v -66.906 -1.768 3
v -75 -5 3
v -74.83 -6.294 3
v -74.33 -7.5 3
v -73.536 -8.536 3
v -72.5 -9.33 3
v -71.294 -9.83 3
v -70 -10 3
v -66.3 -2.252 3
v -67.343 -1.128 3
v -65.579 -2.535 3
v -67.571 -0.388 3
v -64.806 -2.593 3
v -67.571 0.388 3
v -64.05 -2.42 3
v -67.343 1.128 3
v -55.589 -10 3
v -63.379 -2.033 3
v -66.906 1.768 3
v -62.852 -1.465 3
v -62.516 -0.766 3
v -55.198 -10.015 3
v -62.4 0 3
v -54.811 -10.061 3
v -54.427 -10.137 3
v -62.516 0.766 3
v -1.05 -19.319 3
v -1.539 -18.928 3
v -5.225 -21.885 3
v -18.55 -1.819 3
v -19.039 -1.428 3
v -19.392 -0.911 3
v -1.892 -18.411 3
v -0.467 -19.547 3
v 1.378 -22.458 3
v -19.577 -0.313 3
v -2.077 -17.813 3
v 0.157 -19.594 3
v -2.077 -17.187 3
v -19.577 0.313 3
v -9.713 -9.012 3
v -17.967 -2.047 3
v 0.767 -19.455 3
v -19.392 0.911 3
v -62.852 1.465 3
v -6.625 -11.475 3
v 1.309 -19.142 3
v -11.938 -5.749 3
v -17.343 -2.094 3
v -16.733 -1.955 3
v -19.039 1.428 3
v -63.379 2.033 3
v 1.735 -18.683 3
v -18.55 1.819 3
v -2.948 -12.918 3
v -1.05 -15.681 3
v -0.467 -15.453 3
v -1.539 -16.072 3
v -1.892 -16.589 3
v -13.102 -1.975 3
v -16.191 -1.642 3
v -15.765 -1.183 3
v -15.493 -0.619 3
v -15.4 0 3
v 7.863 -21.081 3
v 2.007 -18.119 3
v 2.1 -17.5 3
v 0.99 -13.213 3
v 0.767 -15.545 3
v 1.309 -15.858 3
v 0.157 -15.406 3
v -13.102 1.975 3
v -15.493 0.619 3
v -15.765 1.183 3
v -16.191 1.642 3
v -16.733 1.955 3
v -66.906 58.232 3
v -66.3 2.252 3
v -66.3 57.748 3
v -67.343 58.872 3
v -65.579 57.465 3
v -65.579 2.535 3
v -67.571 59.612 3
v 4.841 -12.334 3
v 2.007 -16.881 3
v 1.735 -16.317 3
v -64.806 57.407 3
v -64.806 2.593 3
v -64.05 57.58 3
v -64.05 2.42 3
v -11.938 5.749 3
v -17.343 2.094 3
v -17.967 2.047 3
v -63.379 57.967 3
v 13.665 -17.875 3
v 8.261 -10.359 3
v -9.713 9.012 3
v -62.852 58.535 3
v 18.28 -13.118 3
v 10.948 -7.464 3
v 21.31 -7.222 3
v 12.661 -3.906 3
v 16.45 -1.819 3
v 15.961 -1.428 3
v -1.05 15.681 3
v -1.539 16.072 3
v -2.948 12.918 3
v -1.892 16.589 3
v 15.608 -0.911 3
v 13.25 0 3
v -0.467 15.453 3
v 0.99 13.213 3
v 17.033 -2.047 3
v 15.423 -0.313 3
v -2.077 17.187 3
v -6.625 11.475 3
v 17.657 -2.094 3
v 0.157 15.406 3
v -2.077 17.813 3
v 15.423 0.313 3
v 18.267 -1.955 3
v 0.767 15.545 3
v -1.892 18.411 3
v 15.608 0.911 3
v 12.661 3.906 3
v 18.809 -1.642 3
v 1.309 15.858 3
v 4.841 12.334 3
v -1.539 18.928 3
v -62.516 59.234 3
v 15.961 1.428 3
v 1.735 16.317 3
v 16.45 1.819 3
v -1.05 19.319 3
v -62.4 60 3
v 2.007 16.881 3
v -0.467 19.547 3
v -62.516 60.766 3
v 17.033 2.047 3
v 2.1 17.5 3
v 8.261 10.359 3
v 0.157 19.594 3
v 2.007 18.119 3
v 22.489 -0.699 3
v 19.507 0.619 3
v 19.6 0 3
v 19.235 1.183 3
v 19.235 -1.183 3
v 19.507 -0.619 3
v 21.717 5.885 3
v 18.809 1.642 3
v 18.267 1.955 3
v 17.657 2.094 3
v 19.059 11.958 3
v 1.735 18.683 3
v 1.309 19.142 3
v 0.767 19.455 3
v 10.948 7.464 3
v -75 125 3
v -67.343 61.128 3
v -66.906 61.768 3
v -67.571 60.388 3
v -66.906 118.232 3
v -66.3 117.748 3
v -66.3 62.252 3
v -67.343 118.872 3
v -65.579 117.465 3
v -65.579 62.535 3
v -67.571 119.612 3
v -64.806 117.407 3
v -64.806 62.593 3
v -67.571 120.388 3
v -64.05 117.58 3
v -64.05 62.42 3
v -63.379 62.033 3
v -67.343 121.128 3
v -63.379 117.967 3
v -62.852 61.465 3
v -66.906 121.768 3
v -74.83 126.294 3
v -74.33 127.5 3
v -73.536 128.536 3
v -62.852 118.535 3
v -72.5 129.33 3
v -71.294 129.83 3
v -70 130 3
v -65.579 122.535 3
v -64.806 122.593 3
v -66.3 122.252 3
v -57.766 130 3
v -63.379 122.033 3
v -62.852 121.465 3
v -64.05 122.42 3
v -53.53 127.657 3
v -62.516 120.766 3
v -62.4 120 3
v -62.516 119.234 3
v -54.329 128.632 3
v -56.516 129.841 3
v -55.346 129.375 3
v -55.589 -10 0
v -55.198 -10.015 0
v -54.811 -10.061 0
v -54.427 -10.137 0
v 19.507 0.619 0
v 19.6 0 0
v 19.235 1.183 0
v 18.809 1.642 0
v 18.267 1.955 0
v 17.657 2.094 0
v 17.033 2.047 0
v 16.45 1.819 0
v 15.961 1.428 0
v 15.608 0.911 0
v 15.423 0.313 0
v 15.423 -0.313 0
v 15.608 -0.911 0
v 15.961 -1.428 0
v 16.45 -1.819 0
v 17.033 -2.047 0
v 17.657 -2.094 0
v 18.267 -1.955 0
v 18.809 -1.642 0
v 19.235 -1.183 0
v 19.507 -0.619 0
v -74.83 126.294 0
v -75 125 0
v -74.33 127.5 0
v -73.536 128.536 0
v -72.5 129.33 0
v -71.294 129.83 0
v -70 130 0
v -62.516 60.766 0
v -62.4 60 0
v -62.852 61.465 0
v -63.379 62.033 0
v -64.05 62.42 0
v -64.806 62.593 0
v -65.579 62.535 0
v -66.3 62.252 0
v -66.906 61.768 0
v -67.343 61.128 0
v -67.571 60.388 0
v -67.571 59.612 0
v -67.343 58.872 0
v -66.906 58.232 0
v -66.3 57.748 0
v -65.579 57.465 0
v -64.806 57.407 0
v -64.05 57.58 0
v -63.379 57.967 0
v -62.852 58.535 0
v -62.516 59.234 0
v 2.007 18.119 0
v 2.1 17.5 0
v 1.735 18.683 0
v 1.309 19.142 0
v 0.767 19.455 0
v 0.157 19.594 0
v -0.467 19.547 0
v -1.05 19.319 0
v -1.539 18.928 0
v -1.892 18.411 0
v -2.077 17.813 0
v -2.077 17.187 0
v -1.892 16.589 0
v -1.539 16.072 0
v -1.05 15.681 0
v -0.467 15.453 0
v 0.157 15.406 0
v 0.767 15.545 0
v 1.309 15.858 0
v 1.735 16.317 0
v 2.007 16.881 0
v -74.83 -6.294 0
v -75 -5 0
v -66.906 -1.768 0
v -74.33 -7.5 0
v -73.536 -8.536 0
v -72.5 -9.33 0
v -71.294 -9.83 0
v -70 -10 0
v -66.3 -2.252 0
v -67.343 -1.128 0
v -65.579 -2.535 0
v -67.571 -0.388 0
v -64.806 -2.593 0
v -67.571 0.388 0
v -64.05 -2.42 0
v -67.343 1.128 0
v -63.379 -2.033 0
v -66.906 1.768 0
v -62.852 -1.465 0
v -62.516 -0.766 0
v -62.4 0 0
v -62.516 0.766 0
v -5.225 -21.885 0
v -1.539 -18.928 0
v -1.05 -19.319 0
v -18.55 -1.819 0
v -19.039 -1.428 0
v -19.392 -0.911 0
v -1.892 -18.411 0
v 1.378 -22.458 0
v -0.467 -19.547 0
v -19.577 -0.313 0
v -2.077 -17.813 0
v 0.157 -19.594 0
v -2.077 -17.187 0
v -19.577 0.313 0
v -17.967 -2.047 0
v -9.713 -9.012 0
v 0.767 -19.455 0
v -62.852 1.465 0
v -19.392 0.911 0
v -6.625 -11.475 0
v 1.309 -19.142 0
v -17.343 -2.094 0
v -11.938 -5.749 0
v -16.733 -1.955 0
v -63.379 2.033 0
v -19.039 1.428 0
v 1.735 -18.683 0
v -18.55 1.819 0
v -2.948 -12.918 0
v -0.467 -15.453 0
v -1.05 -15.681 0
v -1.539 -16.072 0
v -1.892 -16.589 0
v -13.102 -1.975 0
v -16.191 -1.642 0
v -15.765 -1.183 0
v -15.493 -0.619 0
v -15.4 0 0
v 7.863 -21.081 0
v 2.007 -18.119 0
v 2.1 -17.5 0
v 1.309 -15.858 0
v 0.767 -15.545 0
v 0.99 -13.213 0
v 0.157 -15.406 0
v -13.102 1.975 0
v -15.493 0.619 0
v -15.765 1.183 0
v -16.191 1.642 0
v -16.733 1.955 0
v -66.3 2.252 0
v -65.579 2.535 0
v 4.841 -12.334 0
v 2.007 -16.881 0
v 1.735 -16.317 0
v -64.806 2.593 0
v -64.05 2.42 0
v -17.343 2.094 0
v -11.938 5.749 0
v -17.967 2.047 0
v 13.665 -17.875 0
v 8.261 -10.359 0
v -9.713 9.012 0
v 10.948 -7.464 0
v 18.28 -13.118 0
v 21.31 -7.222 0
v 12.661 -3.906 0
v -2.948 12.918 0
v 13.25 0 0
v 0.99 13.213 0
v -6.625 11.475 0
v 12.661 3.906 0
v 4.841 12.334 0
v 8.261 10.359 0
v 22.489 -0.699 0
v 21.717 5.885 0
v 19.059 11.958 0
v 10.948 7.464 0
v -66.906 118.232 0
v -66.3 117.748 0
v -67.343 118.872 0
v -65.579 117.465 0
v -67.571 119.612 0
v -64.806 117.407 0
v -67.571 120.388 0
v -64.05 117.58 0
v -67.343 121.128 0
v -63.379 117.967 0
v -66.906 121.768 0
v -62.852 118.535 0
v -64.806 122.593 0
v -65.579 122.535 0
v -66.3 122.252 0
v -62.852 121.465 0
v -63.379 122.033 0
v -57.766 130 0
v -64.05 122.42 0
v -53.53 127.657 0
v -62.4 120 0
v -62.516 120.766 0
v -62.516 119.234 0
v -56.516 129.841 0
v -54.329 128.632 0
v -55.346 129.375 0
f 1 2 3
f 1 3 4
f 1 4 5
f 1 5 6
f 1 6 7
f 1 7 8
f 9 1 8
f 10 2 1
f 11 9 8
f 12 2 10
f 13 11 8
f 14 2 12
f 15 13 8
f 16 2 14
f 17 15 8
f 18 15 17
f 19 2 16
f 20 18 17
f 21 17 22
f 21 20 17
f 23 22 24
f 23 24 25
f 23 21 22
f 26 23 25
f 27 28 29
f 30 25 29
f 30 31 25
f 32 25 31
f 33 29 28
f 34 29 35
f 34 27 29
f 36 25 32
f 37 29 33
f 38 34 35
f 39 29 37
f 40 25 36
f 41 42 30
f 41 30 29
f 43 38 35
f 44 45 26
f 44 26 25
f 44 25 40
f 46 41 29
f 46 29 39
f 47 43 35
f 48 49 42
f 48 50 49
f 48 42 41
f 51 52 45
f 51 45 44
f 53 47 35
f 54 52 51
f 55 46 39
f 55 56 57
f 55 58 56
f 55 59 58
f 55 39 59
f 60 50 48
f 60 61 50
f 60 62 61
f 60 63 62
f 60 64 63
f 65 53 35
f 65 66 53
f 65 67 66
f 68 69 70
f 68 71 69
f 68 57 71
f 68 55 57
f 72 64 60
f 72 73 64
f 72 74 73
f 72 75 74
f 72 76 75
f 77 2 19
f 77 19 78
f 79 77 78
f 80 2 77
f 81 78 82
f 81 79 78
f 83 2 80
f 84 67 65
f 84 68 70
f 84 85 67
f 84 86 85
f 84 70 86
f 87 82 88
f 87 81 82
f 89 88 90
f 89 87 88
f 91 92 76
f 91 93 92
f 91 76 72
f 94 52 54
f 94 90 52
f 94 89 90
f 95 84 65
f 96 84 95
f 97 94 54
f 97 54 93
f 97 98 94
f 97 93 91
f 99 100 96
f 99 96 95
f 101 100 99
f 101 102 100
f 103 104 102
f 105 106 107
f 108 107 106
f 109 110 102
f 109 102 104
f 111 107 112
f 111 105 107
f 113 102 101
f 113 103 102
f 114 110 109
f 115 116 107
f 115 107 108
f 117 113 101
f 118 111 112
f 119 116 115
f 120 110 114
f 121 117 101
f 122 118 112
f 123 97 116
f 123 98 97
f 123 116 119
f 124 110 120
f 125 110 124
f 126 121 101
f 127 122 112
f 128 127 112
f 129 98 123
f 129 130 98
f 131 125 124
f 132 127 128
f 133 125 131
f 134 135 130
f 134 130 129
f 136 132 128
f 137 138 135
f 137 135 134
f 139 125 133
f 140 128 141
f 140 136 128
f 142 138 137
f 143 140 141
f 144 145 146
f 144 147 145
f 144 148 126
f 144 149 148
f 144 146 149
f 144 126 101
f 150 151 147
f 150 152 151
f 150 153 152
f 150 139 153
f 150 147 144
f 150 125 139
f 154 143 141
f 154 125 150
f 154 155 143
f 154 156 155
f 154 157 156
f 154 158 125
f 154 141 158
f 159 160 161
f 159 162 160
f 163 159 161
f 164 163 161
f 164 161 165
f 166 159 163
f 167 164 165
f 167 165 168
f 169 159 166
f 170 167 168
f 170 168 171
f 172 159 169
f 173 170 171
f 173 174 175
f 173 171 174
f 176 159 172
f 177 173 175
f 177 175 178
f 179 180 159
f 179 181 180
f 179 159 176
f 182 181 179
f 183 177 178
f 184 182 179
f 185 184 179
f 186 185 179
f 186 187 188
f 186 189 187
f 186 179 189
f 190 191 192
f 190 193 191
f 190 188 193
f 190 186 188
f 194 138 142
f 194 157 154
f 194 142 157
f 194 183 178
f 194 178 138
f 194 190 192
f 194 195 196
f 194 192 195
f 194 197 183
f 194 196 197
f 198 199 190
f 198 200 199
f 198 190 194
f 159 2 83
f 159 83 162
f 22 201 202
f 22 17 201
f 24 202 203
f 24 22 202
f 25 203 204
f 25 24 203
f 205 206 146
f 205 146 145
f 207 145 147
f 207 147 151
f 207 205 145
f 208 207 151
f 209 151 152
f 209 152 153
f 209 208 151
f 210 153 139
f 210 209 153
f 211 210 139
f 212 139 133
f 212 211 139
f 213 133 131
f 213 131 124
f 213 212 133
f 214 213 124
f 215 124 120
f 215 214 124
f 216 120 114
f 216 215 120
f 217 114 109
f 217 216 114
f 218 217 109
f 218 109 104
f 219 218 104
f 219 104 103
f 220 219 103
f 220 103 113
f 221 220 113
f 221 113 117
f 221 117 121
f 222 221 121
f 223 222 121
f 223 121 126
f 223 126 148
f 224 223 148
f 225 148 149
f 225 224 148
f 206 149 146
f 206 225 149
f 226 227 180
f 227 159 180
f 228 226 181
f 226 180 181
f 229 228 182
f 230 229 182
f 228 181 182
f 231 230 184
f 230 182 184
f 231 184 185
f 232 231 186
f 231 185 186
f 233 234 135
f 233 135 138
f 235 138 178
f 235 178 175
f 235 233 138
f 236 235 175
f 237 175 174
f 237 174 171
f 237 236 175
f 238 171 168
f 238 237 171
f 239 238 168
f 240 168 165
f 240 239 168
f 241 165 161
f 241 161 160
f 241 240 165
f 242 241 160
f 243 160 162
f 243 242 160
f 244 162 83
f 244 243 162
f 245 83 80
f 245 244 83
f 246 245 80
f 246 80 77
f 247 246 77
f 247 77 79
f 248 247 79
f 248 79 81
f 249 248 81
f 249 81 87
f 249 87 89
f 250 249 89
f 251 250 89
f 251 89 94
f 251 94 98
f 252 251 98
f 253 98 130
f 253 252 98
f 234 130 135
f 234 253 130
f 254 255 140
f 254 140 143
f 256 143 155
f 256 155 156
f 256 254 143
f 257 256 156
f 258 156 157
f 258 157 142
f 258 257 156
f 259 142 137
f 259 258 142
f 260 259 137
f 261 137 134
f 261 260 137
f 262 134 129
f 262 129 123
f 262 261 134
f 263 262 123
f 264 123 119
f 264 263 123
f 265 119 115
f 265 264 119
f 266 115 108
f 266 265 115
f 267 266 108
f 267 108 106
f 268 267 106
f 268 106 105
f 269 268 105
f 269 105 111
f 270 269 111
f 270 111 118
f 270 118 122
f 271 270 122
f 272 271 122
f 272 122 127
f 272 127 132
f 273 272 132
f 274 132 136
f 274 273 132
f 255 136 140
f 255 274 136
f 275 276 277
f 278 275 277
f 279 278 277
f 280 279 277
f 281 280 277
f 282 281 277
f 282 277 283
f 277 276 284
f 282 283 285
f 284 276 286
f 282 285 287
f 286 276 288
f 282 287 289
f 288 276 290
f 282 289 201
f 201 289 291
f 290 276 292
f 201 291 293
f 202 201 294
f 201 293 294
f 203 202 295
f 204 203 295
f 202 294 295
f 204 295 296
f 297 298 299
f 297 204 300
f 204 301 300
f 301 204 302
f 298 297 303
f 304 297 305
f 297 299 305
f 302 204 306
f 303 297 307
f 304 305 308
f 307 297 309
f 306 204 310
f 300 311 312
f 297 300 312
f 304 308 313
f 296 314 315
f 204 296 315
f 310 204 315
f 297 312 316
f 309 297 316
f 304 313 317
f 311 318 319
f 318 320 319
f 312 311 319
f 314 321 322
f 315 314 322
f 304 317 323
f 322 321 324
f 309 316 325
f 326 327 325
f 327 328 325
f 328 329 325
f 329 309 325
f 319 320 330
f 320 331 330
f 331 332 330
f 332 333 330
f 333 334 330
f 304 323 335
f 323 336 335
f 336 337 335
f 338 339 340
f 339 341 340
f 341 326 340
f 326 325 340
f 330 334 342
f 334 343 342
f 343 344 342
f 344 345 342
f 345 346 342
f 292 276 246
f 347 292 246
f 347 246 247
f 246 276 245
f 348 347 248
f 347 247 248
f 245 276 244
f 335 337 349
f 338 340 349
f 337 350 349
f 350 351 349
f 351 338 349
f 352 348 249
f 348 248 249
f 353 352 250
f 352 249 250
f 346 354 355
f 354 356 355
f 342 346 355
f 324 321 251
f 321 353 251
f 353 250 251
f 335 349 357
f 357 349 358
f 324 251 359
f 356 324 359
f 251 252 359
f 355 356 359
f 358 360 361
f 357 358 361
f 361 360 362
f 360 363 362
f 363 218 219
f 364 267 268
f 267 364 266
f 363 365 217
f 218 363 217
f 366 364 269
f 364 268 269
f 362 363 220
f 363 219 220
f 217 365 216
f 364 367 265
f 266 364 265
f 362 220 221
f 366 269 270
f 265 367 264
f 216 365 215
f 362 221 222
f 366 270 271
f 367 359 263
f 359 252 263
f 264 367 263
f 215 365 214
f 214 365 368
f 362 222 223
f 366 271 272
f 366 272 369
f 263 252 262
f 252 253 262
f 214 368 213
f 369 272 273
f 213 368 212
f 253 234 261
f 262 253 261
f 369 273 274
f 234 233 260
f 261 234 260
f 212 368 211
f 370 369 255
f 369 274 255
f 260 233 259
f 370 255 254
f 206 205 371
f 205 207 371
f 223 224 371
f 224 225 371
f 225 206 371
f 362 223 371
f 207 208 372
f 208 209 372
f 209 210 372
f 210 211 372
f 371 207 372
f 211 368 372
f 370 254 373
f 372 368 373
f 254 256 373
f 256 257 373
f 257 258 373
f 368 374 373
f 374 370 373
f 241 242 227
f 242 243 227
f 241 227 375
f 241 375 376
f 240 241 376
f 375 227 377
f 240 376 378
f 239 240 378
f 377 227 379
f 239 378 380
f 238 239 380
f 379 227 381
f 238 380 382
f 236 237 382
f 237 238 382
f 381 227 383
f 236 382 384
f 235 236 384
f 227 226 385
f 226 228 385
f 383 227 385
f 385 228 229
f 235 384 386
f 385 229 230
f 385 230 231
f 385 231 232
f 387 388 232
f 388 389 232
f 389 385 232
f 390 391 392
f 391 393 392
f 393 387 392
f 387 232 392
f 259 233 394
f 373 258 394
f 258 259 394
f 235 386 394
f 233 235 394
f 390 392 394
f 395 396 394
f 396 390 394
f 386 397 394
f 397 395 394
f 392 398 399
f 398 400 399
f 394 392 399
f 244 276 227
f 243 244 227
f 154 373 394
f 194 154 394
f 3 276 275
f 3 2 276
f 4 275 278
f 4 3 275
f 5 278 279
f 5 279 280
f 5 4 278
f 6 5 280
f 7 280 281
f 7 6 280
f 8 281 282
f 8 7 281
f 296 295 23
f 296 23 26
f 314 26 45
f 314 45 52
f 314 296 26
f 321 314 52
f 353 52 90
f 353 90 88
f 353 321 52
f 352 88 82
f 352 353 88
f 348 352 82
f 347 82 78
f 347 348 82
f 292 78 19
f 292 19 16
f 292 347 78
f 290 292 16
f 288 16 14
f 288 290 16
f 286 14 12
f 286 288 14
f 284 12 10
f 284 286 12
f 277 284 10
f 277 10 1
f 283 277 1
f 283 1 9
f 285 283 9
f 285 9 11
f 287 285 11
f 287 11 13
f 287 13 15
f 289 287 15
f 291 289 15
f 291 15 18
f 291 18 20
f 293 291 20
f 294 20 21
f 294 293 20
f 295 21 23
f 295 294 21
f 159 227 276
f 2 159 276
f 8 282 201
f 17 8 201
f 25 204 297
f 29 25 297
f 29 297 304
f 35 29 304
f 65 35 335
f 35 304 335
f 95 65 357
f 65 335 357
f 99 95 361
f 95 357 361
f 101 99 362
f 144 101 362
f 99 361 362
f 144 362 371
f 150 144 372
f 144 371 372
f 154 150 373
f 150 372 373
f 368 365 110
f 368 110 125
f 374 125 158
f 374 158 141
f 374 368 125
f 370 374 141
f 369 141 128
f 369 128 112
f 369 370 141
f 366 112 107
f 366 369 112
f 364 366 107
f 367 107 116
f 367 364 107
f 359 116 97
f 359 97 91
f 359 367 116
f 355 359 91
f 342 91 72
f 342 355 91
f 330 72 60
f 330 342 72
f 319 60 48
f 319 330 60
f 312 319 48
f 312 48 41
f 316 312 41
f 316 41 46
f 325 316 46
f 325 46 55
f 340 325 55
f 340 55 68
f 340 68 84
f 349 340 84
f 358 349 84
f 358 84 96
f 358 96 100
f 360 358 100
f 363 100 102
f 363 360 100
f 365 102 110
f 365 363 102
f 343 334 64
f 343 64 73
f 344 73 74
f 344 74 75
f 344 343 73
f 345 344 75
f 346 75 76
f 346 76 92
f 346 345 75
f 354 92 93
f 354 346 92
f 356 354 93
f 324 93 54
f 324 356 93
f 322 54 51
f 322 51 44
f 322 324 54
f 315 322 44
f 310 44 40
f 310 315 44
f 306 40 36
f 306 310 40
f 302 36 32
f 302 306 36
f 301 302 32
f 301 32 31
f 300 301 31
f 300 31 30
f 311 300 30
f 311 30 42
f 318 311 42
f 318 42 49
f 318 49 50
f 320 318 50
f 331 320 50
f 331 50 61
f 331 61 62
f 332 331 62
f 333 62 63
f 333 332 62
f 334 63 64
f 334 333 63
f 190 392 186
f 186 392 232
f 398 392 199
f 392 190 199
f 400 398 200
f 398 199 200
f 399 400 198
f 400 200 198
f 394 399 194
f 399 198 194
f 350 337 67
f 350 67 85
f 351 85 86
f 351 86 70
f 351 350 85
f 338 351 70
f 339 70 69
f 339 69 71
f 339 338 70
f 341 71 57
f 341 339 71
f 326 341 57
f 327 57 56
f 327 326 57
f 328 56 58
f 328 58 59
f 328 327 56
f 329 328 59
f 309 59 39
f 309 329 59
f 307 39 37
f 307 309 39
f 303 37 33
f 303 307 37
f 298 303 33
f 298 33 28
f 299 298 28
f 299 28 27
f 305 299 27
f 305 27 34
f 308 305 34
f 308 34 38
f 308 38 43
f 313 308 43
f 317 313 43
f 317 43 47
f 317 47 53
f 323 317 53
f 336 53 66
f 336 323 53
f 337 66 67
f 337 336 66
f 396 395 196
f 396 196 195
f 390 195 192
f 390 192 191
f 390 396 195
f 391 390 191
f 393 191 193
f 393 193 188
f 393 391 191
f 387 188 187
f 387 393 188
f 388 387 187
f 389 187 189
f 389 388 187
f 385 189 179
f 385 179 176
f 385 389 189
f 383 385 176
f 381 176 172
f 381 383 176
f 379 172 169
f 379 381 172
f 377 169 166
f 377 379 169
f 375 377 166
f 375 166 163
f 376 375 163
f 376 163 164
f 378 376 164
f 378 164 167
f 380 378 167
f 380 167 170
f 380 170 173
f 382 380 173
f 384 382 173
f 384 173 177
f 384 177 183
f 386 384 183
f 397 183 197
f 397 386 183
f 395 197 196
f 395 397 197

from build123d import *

# Parameters (mm, degrees)
SKETCH_2_R      = 13.25
SKETCH_2_R_2    = 2.1
SKETCH_2_R_3    = 2.6
EXTRUDE_1_DEPTH = 3
FILLET_3_R      = 5


with BuildPart() as part:
    # ｽｹｯﾁ2 → ﾎﾞｽ - 押し出し1 (new body)
    with BuildSketch(Plane.XY):
        with BuildLine():
            Line((-75, 130), (-75, -10))
            Line((-75, -10), (-55, -10))
            Line((-55, -10), (-5.225491892, -21.884794596))
            ThreePointArc((-5.225491892, -21.884794596), (18.280450485, -13.117741043), (19.059394587, 11.957820787))
            Line((19.059394587, 11.957820787), (-55, 130))
            Line((-55, 130), (-75, 130))
        make_face()
        Circle(SKETCH_2_R, mode=Mode.SUBTRACT)
        with Locations((0, 17.5)):
            Circle(SKETCH_2_R_2, mode=Mode.SUBTRACT)
        with Locations((17.5, 0)):
            Circle(SKETCH_2_R_2, mode=Mode.SUBTRACT)
        with Locations((0, -17.5)):
            Circle(SKETCH_2_R_2, mode=Mode.SUBTRACT)
        with Locations((-17.5, 0)):
            Circle(SKETCH_2_R_2, mode=Mode.SUBTRACT)
        with Locations((-65, 60)):
            Circle(SKETCH_2_R_3, mode=Mode.SUBTRACT)
        with Locations((-65, 120)):
            Circle(SKETCH_2_R_3, mode=Mode.SUBTRACT)
        with Locations((-65, 0)):
            Circle(SKETCH_2_R_3, mode=Mode.SUBTRACT)
    extrude(amount=EXTRUDE_1_DEPTH)

    # ﾌｨﾚｯﾄ3
    fillet_3_edges = [part.edges().sort_by_distance(p)[0] for p in [
        (-55, 130, 1.5),
        (-55, -10, 1.5),
        (-75, -10, 1.5),
        (-75, 130, 1.5),
    ]]
    fillet(fillet_3_edges, radius=FILLET_3_R)


solid = part.part
